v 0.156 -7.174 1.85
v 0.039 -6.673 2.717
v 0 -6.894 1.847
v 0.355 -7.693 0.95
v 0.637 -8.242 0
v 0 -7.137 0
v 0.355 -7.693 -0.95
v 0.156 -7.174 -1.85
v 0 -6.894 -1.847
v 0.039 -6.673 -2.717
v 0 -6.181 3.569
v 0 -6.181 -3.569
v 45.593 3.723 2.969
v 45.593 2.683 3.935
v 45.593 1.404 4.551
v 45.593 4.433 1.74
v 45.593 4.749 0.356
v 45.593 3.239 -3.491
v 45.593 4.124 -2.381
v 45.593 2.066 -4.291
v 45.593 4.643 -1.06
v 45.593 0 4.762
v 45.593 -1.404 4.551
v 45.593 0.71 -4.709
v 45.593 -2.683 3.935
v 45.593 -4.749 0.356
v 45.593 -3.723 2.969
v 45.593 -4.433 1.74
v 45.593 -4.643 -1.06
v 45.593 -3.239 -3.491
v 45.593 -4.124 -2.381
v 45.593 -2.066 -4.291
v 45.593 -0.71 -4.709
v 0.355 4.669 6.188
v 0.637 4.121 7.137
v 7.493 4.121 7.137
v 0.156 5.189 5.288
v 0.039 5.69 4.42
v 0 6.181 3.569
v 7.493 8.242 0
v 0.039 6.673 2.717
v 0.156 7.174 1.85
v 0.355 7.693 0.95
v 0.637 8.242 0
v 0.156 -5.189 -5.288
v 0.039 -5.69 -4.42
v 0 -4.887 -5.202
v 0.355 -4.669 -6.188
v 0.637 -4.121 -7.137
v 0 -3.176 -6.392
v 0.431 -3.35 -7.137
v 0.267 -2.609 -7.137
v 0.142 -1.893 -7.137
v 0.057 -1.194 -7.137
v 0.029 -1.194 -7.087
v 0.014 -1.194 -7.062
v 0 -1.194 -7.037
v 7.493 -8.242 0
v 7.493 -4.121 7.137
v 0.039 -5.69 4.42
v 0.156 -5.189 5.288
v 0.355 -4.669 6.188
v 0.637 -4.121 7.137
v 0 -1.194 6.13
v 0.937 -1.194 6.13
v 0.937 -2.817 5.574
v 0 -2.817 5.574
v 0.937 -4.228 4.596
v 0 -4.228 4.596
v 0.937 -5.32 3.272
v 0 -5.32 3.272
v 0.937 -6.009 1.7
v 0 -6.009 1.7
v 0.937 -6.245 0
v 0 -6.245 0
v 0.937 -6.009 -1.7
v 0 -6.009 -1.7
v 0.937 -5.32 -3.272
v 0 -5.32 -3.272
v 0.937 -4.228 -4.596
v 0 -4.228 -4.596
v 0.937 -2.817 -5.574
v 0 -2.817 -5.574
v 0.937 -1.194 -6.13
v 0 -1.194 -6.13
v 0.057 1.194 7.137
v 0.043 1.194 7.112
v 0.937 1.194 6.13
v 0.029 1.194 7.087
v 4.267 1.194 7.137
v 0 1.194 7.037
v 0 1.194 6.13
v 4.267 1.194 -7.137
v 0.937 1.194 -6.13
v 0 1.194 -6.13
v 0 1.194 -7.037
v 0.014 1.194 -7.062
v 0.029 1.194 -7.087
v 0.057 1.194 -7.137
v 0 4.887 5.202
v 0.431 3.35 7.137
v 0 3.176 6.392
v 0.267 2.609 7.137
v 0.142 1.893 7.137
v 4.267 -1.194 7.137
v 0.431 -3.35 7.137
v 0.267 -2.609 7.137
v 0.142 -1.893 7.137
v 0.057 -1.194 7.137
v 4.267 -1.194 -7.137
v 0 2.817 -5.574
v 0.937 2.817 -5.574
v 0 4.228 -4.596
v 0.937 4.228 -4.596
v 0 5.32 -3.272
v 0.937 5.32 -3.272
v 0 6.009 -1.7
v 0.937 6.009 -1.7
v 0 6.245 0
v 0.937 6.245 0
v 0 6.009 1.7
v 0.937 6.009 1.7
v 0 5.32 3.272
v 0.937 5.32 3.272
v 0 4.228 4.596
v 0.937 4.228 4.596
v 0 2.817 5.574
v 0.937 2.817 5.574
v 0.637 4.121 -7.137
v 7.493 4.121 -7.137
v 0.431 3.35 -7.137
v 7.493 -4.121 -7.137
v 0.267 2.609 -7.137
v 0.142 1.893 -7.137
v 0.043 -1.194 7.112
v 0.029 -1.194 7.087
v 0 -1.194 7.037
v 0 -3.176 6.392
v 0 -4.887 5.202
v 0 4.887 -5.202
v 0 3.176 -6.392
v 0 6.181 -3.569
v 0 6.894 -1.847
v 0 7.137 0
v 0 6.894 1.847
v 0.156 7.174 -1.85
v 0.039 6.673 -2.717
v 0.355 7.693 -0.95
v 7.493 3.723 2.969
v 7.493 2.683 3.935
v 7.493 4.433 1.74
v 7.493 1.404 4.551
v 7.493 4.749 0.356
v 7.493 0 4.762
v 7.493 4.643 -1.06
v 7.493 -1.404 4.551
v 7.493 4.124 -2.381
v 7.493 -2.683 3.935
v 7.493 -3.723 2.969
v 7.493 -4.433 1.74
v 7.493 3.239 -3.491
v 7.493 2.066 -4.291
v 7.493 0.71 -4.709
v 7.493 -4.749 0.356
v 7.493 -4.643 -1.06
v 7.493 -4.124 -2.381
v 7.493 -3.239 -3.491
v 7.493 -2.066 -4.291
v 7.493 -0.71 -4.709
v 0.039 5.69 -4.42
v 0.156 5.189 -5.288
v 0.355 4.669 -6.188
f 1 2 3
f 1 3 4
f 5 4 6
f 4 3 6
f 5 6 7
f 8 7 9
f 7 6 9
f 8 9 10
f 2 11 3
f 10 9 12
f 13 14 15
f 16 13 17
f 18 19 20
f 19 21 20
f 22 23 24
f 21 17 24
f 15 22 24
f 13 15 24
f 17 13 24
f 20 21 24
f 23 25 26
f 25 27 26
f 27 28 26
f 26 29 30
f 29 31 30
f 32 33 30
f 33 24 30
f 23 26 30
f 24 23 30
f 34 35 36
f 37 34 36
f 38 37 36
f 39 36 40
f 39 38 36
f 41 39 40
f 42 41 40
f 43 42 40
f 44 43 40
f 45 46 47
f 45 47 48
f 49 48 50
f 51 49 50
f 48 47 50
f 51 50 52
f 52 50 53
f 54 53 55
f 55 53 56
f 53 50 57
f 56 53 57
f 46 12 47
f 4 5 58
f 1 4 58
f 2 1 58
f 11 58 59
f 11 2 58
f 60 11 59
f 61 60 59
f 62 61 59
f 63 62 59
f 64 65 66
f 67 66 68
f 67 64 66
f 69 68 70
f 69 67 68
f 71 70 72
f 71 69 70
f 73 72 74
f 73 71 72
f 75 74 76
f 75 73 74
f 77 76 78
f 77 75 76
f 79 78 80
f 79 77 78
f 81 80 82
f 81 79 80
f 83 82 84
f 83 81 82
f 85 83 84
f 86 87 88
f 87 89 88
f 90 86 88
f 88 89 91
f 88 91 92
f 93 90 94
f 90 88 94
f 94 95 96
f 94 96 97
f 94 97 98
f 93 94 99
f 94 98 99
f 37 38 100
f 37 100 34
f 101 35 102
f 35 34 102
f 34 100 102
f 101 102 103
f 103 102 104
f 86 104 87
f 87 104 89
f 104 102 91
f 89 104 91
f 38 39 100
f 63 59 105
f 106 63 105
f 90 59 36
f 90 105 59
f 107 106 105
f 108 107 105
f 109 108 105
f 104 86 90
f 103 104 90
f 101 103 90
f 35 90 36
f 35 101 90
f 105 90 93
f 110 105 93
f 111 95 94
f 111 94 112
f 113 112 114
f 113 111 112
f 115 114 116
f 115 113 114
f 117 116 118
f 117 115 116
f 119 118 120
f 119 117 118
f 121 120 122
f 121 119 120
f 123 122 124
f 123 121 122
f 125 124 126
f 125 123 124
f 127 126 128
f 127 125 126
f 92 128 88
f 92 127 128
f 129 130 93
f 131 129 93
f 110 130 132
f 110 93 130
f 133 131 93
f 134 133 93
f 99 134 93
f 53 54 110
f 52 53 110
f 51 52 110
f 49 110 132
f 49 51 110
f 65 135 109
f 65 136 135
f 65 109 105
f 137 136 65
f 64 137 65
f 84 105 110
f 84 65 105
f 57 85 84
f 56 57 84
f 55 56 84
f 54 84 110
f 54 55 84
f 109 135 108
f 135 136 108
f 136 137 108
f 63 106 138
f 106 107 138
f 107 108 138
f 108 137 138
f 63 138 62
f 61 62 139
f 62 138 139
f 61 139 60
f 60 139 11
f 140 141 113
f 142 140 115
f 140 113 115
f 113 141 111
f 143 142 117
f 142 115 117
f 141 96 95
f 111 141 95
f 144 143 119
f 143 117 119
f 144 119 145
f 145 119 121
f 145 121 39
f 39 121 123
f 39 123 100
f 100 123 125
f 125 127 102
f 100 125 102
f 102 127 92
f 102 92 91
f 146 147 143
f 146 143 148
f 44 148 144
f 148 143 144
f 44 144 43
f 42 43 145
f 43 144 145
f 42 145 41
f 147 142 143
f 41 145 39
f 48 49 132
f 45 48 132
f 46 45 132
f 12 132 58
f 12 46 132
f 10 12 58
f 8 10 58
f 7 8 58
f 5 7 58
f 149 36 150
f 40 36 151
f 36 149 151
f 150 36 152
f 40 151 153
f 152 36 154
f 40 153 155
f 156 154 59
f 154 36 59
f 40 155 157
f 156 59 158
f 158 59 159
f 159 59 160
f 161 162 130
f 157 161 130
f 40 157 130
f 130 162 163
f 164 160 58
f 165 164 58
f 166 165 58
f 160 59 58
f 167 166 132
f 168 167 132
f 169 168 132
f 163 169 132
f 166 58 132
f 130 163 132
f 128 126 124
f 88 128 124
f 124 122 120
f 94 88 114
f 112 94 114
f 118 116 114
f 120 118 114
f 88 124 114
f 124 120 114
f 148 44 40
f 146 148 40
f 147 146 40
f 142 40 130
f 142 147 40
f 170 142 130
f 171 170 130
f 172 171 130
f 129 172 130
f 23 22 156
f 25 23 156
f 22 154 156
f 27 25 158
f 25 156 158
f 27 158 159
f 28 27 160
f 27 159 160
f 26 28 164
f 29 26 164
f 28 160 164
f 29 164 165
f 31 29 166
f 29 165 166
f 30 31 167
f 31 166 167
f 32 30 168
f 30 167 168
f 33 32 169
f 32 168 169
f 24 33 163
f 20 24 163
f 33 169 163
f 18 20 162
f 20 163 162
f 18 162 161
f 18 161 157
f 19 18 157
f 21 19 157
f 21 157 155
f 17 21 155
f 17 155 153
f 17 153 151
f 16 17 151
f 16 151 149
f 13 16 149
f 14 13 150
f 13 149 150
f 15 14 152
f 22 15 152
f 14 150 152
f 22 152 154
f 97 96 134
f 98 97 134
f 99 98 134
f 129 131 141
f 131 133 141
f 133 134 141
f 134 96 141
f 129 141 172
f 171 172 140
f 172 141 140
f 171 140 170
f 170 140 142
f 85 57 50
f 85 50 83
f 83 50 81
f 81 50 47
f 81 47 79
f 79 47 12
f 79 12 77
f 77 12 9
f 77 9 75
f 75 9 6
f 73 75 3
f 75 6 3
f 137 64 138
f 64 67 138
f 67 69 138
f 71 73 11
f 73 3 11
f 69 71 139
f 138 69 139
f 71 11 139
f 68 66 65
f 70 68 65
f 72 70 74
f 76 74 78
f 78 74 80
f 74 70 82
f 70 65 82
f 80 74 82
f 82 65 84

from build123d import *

# Parameters (mm, degrees)
HEX_DIE_START = -2e-06
SKETCH2_R     = 8.3242194
HEX_DIE_DEPTH = 7.493002
SKETCH3_W     = 16.483602772
SKETCH3_H     = 2.3876
SLOT_DEPTH    = 4.2672
SKETCH4_R     = 6.245225
INDENT_DEPTH  = 0.936625


with BuildPart() as part:
    # BodySke → Base-Revolve (revolve)
    with BuildSketch(Plane.XY, mode=Mode.PRIVATE) as base_revolve_sk:
        Polygon((7.493, 4.7625), (7.493, 8.241801386), (0.637626437, 8.241801386), (0, 7.1374), (0, 0), (45.593, 0), (45.593, 4.7625), align=None)
    revolve(base_revolve_sk.sketch.rotate(Axis((-25.4, 0, 0), (1, 0, 0)), 90), axis=Axis((-25.4, 0, 0), (1, 0, 0)))

    # Sketch2 → Hex-Die (cut)
    with BuildSketch(Plane(origin=(0, 0, 0), x_dir=(0, 0, -1), z_dir=(1, 0, 0)).offset(HEX_DIE_START)):
        Circle(SKETCH2_R)
        Polygon((-7.1374, 4.120779829), (0, 8.241559659), (7.1374, 4.120779829), (7.1374, -4.120779829), (0, -8.241559659), (-7.1374, -4.120779829), align=None, mode=Mode.SUBTRACT)
    extrude(amount=HEX_DIE_DEPTH, mode=Mode.SUBTRACT)

    # Sketch3 → Slot (cut)
    with BuildSketch(Plane(origin=(0, 0, 0), x_dir=(0, 0, -1), z_dir=(1, 0, 0))):
        Rectangle(SKETCH3_W, SKETCH3_H)
    extrude(amount=SLOT_DEPTH, mode=Mode.SUBTRACT)

    # Sketch4 → Indent (cut)
    with BuildSketch(Plane(origin=(0, 0, 0), x_dir=(0, 0, -1), z_dir=(1, 0, 0))):
        Circle(SKETCH4_R)
    extrude(amount=INDENT_DEPTH, mode=Mode.SUBTRACT)


solid = part.part
